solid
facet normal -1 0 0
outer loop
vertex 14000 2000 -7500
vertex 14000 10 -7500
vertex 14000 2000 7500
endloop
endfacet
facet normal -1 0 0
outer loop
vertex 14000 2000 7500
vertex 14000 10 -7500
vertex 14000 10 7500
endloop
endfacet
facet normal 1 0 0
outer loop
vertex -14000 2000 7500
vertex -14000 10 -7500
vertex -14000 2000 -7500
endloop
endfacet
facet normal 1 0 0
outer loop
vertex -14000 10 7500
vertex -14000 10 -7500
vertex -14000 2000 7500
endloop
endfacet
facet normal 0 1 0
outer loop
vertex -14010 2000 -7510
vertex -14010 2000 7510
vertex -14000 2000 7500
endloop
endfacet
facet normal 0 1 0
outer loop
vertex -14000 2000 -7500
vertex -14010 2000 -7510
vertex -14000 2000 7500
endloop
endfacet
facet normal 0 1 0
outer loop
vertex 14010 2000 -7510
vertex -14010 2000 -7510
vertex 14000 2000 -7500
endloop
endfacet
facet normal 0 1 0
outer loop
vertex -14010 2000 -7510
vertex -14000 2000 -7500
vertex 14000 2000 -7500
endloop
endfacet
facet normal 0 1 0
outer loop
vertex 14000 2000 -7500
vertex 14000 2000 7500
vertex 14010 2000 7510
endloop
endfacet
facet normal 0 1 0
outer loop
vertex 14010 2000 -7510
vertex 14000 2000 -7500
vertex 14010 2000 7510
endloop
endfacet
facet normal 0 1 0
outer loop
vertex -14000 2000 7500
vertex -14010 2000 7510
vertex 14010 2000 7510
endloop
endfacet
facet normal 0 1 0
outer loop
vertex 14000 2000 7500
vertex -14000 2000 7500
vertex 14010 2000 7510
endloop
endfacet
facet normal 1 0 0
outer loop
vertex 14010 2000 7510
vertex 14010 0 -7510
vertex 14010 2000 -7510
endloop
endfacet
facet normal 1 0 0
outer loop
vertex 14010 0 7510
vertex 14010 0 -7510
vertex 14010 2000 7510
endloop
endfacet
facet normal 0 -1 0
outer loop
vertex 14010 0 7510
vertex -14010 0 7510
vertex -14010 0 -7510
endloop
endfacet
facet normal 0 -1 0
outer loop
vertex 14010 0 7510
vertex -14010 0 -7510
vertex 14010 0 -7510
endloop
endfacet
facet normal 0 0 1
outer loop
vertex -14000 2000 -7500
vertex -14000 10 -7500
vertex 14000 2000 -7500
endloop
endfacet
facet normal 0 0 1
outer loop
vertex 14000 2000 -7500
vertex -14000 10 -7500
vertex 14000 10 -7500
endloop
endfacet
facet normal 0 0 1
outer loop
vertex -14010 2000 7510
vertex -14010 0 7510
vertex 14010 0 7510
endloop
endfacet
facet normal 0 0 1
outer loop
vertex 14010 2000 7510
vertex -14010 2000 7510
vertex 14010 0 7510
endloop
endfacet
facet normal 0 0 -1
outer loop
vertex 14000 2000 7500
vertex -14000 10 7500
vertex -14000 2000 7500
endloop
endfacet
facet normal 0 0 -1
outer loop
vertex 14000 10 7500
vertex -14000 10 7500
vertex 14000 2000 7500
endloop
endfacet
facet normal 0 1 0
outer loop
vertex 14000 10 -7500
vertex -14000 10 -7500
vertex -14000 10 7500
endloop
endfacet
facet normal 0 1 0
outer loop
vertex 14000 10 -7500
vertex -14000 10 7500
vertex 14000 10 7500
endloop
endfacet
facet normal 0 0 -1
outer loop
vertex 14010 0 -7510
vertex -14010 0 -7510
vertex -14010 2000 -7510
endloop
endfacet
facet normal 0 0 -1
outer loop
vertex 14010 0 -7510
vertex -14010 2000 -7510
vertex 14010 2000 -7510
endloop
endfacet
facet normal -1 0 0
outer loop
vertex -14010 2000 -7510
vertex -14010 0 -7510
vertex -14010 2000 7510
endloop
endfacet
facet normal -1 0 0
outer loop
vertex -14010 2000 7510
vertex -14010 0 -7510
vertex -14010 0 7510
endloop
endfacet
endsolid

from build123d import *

# Parameters (mm, degrees)
SKETCH_1_W      = 28000
SKETCH_1_H      = 15000
EXTRUDE_1_DEPTH = 10
SKETCH_3_W      = 28020
SKETCH_3_H      = 15020
SKETCH_3_W_2    = 28000
SKETCH_3_H_2    = 15000
EXTRUDE_2_DEPTH = 2000


with BuildPart() as part:
    # 草图1 → 凸台-拉伸1 (new body)
    with BuildSketch(Plane(origin=(0, 0, 0), x_dir=(1, 0, 0), z_dir=(0, 1, 0))):
        Rectangle(SKETCH_1_W, SKETCH_1_H)
    extrude(amount=EXTRUDE_1_DEPTH)

    # 草图3 → 凸台-拉伸2 (add)
    with BuildSketch(Plane.XZ):
        Rectangle(SKETCH_3_W, SKETCH_3_H)
        Rectangle(SKETCH_3_W_2, SKETCH_3_H_2, mode=Mode.SUBTRACT)
    extrude(amount=-EXTRUDE_2_DEPTH)


solid = part.part
